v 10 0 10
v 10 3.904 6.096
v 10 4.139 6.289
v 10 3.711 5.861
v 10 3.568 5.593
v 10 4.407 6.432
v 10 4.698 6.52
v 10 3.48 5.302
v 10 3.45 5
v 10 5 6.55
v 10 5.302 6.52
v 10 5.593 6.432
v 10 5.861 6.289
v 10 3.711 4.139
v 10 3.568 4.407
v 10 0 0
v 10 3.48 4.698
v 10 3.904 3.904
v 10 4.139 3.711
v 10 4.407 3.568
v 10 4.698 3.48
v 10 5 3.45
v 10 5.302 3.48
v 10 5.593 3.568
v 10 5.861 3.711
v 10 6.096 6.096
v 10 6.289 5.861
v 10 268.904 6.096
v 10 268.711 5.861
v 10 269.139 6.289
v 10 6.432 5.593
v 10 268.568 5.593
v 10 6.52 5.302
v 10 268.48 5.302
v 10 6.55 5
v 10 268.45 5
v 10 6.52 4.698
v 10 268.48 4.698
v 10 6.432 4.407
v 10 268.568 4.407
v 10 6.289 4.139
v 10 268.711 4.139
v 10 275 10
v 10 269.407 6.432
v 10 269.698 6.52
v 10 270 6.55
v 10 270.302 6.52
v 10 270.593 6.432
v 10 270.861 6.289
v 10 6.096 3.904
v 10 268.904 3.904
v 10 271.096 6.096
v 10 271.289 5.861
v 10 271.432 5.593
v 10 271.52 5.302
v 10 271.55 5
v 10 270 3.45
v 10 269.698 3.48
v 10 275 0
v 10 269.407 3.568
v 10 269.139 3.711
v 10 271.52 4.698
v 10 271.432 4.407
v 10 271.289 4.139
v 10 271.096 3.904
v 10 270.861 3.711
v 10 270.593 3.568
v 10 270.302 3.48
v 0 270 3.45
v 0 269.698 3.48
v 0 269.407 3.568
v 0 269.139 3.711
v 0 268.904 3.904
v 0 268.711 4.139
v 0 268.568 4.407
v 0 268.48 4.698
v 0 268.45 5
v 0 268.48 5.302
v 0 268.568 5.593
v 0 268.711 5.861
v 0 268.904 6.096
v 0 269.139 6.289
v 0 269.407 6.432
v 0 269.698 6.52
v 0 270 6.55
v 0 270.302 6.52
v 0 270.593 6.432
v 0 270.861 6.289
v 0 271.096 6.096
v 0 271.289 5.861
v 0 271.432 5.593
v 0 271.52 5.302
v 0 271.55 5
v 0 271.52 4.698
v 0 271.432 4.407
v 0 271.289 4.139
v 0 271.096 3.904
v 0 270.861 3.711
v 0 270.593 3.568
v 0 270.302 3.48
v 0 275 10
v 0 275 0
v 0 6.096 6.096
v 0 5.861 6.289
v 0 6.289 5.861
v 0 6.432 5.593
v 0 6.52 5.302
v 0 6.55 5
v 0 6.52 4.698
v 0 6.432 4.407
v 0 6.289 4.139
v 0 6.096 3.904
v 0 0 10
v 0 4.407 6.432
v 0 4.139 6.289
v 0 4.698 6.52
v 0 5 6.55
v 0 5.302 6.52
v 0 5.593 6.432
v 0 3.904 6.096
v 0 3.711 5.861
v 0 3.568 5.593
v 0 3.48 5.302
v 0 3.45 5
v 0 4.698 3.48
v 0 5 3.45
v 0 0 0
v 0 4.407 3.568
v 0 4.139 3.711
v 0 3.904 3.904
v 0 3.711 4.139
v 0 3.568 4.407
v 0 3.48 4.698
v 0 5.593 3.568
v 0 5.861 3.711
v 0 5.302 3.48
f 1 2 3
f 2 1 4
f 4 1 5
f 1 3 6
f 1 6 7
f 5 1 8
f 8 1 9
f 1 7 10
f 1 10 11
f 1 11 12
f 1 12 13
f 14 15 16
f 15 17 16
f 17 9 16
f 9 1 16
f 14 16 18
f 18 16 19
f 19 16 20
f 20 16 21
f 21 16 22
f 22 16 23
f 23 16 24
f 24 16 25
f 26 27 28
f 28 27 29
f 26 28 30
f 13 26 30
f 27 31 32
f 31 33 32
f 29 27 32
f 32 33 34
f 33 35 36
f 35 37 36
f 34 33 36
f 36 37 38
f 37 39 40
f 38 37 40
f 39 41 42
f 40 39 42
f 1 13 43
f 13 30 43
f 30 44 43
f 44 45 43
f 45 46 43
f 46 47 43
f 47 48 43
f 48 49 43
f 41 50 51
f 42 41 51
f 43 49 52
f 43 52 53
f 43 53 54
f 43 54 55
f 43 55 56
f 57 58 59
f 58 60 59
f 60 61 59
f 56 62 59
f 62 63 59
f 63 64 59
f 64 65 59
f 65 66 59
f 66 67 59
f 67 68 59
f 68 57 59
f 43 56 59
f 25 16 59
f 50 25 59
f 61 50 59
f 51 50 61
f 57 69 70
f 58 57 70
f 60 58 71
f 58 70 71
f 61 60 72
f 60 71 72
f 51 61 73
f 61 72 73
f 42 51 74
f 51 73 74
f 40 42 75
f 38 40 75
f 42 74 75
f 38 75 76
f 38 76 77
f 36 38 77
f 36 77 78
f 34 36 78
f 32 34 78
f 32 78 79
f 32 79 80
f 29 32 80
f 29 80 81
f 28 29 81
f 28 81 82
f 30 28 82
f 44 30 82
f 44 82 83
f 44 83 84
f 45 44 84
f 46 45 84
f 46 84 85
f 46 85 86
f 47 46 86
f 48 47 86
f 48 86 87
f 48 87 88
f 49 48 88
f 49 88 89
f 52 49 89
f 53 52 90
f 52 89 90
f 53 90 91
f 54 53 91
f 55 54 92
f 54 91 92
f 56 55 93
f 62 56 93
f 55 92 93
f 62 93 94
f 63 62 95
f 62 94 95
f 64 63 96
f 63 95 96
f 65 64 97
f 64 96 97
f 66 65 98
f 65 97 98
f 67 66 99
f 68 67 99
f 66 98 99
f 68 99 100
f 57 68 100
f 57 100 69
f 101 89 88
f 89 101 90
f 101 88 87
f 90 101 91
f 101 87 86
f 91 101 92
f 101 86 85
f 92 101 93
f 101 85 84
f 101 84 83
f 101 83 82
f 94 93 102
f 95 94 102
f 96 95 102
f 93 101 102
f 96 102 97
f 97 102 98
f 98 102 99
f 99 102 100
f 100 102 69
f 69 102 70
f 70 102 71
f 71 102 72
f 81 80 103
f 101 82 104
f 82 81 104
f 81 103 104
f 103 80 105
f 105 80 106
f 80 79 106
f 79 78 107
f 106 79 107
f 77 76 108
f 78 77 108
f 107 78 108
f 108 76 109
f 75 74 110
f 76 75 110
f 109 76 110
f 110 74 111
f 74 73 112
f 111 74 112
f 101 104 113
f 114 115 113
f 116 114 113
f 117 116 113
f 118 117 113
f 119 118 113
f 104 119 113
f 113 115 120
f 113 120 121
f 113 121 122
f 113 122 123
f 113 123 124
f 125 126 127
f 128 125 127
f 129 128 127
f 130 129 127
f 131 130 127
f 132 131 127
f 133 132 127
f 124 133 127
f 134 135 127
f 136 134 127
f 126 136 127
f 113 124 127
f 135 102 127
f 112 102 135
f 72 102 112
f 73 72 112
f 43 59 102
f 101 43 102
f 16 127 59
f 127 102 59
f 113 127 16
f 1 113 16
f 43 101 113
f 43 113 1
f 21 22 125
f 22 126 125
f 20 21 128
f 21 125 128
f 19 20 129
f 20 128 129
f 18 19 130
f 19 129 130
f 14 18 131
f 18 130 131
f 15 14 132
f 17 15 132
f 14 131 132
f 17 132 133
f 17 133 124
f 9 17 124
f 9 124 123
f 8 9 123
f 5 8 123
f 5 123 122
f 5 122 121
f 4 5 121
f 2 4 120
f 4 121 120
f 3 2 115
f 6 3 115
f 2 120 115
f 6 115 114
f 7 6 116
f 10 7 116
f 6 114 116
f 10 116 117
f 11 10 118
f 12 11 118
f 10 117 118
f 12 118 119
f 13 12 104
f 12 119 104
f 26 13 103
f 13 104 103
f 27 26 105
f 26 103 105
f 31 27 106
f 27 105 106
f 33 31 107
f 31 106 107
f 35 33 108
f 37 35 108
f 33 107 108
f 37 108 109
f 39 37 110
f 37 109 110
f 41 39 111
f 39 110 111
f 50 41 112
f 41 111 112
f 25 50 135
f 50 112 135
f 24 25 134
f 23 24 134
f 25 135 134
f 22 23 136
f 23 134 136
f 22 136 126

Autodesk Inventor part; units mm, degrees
ref_plane "YZ Plane" through (0, 0, 0) normal (1, 0, 0) x (0, 1, 0)
ref_plane "XZ Plane" through (0, 0, 0) normal (0, 1, 0) x (-1, 0, 0)
ref_plane "XY Plane" through (0, 0, 0) normal (0, 0, 1) x (1, 0, 0)
sketch "スケッチ1" plane through (0, 0, 0) normal (0, 0, 1) x (1, 0, 0)
  line L0 (0, 0) -> (10, 0)
  line L1 (10, 0) -> (10, 275)
  line L2 (10, 275) -> (0, 275)
  line L3 (0, 275) -> (0, 0)
  dimension "d0" = 10
  dimension "d1" = 275
extrude "押し出し1" add sketch "スケッチ1" along normal blind 10
sketch "スケッチ2" plane through (10, 0, 0) normal (1, 0, 0) x (0, 0, -1)
  line L0 (0, 0) -> (-10, 0) projected
  line L1 (0, 275) -> (-10, 275) projected
  point P0 (-5, 5)
  point P1 (-5, 270)
  point P2 (-5, 0)
  point P3 (-5, 0)
  point P4 (-5, 0)
  point P5 (-5, 275)
  point P6 (-5, 0)
  point P7 (-5, 0)
  dimension "d4" = 5
  dimension "d5" = 5
hole "穴1" at (10, 5, 5) at (10, 270, 5) direction (-1, 0, 0) diameter 3.1 end through all
properties part number "SokuTate"
